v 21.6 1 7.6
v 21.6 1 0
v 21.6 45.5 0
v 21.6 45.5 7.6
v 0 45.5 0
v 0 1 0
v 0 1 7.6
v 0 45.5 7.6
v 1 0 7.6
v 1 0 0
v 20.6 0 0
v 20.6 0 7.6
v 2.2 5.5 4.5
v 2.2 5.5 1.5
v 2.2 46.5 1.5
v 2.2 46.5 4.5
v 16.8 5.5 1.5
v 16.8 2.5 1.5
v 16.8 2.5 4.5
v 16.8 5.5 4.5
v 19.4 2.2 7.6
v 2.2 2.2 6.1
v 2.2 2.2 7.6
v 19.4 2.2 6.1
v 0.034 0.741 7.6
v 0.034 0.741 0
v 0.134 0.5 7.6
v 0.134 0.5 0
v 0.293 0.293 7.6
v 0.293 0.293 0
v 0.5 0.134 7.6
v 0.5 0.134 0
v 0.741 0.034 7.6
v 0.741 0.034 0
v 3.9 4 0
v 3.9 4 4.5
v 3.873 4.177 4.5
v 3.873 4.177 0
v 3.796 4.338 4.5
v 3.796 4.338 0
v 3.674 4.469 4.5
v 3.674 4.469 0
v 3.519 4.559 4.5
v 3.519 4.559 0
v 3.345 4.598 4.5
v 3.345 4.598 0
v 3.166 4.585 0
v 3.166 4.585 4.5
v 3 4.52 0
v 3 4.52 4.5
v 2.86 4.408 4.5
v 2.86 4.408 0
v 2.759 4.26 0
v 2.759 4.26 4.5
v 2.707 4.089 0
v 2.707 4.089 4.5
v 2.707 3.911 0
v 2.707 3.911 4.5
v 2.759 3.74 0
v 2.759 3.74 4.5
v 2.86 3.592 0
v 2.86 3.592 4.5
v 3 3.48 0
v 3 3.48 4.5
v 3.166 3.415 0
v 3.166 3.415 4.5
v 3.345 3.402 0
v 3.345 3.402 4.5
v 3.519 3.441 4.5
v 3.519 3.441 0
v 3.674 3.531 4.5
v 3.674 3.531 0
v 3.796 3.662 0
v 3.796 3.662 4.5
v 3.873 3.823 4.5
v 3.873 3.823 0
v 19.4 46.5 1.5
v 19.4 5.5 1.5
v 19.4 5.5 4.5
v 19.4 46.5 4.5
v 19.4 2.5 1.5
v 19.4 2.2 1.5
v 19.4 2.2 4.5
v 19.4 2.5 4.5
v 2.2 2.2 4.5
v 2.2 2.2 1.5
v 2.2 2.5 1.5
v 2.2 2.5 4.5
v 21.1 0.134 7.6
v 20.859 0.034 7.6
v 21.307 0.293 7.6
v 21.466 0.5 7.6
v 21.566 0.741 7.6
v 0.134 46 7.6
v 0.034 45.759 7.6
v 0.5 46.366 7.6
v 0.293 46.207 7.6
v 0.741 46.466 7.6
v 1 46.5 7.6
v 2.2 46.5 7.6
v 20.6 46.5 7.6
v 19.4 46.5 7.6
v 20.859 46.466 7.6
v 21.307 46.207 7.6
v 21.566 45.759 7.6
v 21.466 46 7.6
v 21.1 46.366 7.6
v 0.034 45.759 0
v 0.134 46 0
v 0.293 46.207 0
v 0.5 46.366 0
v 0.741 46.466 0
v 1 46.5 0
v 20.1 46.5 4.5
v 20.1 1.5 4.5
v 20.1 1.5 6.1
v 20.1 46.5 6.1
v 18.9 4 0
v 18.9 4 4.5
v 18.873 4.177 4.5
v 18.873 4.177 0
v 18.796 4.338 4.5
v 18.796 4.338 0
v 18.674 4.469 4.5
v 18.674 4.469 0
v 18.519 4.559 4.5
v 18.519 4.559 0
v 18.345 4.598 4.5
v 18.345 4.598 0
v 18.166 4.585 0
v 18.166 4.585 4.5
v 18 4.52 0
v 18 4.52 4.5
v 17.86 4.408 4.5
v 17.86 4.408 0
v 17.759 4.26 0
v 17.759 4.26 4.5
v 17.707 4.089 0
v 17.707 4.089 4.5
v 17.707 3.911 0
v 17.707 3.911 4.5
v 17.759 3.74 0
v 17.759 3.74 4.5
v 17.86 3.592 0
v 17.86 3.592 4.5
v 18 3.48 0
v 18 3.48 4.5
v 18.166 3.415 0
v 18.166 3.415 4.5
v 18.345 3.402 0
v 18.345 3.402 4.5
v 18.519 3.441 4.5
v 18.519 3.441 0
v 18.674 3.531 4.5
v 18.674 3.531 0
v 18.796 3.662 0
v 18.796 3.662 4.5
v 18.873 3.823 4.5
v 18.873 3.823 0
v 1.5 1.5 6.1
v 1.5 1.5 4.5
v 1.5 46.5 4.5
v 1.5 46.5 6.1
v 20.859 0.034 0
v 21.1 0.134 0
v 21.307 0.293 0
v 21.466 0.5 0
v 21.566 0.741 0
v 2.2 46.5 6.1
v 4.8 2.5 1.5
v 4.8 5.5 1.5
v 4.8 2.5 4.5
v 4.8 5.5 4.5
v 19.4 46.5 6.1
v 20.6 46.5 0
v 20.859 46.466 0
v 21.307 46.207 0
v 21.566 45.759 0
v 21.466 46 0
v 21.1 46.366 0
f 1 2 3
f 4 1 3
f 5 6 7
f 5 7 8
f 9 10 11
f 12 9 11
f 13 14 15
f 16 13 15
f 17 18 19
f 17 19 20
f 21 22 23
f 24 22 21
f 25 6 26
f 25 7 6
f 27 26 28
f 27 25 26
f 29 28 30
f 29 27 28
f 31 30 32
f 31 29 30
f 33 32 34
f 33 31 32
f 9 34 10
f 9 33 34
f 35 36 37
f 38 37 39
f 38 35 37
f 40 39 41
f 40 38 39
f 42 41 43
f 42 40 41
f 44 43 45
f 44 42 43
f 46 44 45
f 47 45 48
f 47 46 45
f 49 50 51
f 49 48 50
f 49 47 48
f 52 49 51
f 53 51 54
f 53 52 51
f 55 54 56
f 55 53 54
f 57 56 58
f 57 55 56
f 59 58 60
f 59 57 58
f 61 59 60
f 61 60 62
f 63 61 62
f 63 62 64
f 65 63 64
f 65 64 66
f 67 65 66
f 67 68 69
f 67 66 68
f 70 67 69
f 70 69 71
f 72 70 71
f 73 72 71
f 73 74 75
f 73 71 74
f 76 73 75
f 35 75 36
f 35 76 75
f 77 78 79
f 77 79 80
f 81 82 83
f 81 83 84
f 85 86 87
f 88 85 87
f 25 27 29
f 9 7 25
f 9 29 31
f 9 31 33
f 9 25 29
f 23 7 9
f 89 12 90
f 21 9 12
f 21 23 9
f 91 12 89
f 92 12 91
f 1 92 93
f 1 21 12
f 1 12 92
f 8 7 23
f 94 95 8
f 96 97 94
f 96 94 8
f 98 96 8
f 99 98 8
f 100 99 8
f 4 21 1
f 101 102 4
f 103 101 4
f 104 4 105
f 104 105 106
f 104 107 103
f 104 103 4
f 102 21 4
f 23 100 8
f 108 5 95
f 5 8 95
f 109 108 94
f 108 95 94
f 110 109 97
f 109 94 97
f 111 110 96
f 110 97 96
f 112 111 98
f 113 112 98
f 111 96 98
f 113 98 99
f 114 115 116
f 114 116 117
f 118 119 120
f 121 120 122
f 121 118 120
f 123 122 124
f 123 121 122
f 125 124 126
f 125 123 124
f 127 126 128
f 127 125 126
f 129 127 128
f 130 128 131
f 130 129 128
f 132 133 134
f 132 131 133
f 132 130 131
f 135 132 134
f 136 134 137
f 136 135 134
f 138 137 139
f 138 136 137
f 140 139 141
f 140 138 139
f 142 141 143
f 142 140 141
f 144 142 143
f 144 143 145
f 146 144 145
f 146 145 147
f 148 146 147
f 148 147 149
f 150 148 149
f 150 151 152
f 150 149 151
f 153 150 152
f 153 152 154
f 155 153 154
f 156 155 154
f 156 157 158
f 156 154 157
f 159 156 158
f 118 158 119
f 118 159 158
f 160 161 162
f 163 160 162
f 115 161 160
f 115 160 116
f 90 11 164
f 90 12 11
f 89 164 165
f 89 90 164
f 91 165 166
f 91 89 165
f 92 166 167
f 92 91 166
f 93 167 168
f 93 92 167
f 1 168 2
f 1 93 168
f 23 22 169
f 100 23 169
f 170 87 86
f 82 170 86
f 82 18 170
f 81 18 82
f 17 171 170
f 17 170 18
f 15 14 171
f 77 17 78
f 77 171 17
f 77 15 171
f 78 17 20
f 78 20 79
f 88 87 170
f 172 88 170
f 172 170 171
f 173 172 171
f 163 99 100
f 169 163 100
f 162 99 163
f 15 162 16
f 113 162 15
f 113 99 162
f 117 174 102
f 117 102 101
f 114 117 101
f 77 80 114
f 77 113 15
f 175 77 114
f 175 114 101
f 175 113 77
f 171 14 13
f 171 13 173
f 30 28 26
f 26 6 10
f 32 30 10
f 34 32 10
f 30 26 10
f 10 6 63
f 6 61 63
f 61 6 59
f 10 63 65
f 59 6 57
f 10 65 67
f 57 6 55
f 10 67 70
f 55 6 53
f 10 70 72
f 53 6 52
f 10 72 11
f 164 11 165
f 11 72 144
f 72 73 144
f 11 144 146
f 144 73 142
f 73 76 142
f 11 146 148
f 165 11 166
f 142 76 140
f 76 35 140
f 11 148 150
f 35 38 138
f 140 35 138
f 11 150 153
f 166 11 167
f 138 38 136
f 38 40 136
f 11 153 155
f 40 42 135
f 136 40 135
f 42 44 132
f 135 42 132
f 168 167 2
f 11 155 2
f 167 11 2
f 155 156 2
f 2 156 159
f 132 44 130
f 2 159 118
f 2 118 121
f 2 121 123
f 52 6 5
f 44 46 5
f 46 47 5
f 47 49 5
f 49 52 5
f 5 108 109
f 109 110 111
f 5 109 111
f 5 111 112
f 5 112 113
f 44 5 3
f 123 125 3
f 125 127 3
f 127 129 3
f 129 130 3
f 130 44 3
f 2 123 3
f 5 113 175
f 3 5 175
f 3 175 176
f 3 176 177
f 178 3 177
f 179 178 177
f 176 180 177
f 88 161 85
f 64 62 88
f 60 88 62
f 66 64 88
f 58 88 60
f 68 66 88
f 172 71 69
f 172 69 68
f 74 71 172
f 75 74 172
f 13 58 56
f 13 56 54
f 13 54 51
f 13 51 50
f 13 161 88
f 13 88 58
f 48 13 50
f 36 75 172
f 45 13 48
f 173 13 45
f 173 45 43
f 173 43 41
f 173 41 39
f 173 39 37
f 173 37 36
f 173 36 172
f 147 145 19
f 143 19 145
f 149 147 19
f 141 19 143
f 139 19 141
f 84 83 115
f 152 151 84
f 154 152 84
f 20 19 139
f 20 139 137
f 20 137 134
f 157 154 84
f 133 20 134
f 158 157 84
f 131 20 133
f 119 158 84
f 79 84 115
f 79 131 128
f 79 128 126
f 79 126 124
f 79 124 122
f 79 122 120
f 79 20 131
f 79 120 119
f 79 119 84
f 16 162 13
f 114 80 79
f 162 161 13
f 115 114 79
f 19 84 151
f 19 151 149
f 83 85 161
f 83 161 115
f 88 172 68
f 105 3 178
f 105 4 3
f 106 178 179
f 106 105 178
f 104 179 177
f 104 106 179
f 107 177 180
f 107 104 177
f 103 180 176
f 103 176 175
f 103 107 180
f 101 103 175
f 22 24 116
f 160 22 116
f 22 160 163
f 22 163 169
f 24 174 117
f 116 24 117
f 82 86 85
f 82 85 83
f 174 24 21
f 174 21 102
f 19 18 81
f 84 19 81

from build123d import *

# Parameters (mm, degrees)
CYLINDER_R       = 0.6
CYLINDER_DEPTH   = 10
ARRAY001_X_COUNT = 2
ARRAY001_X_PITCH = 15
BOX007_W         = 18.6
BOX007_H         = 45
BOX007_DEPTH     = 1.6
BOX006_W         = 17.2
BOX006_H         = 45.1
BOX006_DEPTH     = 6.1
BOX_W            = 21.6
BOX_H            = 46.5
BOX_DEPTH        = 7.6
FILLET_R         = 1
BOX008_W         = 3
BOX008_H         = 3
BOX008_DEPTH     = 4.5
ARRAY_X_COUNT    = 2
ARRAY_X_PITCH    = 15


with BuildPart() as hole_array001:
    # Cylinder → Cylinder (new body)
    with BuildSketch(Plane.XY):
        Circle(CYLINDER_R)
    extrude(amount=CYLINDER_DEPTH)

    # Array001 X: hole array001 ×2


with BuildPart() as hole_array001_1:
    add(hole_array001.part)
    with Locations(*[(i * ARRAY001_X_PITCH, 0, 0) for i in range(1, ARRAY001_X_COUNT)]):
        add(hole_array001.part)


with BuildPart() as hole_array001_2:
    # Array001 placement: moved
    add(hole_array001_1.part.moved(Location((3.3, 4, 0))))


with BuildPart() as pcb_extract_cube:
    # Box007 → Box007 (new body)
    with BuildSketch(Plane(origin=(1.5, 1.5, 4.5), x_dir=(1, 0, 0), z_dir=(0, 0, 1))):
        with Locations((9.3, 22.5)):
            Rectangle(BOX007_W, BOX007_H)
    extrude(amount=BOX007_DEPTH)


with BuildPart() as extract_fusion:
    # Box006 → Box006 (new body)
    with BuildSketch(Plane(origin=(2.2, 2.2, 1.5), x_dir=(1, 0, 0), z_dir=(0, 0, 1))):
        with Locations((8.6, 22.55)):
            Rectangle(BOX006_W, BOX006_H)
    extrude(amount=BOX006_DEPTH)

    # Fusion: union pcb extract cube
    add(pcb_extract_cube.part)


with BuildPart() as body_cut004:
    # Box → Box (new body)
    with BuildSketch(Plane.XY):
        with Locations((10.8, 23.25)):
            Rectangle(BOX_W, BOX_H)
    extrude(amount=BOX_DEPTH)

    # Fillet
    fillet_edges = [body_cut004.edges().sort_by_distance(p)[0] for p in [
        (0, 0, 3.8),
        (0, 46.5, 3.8),
        (21.6, 0, 3.8),
        (21.6, 46.5, 3.8),
    ]]
    fillet(fillet_edges, radius=FILLET_R)

    # Cut003007: cut extract fusion
    add(extract_fusion.part, mode=Mode.SUBTRACT)


with BuildPart() as body_cut005:
    # Box008 → Box008 (new body)
    with BuildSketch(Plane(origin=(-1.5, -1.5, 0), x_dir=(1, 0, 0), z_dir=(0, 0, 1))):
        with Locations((1.5, 1.5)):
            Rectangle(BOX008_W, BOX008_H)
    extrude(amount=BOX008_DEPTH)

    # Array X: body cut005 ×2


with BuildPart() as body_cut005_1:
    add(body_cut005.part)
    with Locations(*[(i * ARRAY_X_PITCH, 0, 0) for i in range(1, ARRAY_X_COUNT)]):
        add(body_cut005.part)


with BuildPart() as body_cut005_2:
    # Array placement: moved
    add(body_cut005_1.part.moved(Location((3.3, 4, 0))))

    # Fusion006: union body cut004
    add(body_cut004.part)

    # Cut003008: cut hole array001
    add(hole_array001_2.part, mode=Mode.SUBTRACT)


solid = body_cut005_2.part
